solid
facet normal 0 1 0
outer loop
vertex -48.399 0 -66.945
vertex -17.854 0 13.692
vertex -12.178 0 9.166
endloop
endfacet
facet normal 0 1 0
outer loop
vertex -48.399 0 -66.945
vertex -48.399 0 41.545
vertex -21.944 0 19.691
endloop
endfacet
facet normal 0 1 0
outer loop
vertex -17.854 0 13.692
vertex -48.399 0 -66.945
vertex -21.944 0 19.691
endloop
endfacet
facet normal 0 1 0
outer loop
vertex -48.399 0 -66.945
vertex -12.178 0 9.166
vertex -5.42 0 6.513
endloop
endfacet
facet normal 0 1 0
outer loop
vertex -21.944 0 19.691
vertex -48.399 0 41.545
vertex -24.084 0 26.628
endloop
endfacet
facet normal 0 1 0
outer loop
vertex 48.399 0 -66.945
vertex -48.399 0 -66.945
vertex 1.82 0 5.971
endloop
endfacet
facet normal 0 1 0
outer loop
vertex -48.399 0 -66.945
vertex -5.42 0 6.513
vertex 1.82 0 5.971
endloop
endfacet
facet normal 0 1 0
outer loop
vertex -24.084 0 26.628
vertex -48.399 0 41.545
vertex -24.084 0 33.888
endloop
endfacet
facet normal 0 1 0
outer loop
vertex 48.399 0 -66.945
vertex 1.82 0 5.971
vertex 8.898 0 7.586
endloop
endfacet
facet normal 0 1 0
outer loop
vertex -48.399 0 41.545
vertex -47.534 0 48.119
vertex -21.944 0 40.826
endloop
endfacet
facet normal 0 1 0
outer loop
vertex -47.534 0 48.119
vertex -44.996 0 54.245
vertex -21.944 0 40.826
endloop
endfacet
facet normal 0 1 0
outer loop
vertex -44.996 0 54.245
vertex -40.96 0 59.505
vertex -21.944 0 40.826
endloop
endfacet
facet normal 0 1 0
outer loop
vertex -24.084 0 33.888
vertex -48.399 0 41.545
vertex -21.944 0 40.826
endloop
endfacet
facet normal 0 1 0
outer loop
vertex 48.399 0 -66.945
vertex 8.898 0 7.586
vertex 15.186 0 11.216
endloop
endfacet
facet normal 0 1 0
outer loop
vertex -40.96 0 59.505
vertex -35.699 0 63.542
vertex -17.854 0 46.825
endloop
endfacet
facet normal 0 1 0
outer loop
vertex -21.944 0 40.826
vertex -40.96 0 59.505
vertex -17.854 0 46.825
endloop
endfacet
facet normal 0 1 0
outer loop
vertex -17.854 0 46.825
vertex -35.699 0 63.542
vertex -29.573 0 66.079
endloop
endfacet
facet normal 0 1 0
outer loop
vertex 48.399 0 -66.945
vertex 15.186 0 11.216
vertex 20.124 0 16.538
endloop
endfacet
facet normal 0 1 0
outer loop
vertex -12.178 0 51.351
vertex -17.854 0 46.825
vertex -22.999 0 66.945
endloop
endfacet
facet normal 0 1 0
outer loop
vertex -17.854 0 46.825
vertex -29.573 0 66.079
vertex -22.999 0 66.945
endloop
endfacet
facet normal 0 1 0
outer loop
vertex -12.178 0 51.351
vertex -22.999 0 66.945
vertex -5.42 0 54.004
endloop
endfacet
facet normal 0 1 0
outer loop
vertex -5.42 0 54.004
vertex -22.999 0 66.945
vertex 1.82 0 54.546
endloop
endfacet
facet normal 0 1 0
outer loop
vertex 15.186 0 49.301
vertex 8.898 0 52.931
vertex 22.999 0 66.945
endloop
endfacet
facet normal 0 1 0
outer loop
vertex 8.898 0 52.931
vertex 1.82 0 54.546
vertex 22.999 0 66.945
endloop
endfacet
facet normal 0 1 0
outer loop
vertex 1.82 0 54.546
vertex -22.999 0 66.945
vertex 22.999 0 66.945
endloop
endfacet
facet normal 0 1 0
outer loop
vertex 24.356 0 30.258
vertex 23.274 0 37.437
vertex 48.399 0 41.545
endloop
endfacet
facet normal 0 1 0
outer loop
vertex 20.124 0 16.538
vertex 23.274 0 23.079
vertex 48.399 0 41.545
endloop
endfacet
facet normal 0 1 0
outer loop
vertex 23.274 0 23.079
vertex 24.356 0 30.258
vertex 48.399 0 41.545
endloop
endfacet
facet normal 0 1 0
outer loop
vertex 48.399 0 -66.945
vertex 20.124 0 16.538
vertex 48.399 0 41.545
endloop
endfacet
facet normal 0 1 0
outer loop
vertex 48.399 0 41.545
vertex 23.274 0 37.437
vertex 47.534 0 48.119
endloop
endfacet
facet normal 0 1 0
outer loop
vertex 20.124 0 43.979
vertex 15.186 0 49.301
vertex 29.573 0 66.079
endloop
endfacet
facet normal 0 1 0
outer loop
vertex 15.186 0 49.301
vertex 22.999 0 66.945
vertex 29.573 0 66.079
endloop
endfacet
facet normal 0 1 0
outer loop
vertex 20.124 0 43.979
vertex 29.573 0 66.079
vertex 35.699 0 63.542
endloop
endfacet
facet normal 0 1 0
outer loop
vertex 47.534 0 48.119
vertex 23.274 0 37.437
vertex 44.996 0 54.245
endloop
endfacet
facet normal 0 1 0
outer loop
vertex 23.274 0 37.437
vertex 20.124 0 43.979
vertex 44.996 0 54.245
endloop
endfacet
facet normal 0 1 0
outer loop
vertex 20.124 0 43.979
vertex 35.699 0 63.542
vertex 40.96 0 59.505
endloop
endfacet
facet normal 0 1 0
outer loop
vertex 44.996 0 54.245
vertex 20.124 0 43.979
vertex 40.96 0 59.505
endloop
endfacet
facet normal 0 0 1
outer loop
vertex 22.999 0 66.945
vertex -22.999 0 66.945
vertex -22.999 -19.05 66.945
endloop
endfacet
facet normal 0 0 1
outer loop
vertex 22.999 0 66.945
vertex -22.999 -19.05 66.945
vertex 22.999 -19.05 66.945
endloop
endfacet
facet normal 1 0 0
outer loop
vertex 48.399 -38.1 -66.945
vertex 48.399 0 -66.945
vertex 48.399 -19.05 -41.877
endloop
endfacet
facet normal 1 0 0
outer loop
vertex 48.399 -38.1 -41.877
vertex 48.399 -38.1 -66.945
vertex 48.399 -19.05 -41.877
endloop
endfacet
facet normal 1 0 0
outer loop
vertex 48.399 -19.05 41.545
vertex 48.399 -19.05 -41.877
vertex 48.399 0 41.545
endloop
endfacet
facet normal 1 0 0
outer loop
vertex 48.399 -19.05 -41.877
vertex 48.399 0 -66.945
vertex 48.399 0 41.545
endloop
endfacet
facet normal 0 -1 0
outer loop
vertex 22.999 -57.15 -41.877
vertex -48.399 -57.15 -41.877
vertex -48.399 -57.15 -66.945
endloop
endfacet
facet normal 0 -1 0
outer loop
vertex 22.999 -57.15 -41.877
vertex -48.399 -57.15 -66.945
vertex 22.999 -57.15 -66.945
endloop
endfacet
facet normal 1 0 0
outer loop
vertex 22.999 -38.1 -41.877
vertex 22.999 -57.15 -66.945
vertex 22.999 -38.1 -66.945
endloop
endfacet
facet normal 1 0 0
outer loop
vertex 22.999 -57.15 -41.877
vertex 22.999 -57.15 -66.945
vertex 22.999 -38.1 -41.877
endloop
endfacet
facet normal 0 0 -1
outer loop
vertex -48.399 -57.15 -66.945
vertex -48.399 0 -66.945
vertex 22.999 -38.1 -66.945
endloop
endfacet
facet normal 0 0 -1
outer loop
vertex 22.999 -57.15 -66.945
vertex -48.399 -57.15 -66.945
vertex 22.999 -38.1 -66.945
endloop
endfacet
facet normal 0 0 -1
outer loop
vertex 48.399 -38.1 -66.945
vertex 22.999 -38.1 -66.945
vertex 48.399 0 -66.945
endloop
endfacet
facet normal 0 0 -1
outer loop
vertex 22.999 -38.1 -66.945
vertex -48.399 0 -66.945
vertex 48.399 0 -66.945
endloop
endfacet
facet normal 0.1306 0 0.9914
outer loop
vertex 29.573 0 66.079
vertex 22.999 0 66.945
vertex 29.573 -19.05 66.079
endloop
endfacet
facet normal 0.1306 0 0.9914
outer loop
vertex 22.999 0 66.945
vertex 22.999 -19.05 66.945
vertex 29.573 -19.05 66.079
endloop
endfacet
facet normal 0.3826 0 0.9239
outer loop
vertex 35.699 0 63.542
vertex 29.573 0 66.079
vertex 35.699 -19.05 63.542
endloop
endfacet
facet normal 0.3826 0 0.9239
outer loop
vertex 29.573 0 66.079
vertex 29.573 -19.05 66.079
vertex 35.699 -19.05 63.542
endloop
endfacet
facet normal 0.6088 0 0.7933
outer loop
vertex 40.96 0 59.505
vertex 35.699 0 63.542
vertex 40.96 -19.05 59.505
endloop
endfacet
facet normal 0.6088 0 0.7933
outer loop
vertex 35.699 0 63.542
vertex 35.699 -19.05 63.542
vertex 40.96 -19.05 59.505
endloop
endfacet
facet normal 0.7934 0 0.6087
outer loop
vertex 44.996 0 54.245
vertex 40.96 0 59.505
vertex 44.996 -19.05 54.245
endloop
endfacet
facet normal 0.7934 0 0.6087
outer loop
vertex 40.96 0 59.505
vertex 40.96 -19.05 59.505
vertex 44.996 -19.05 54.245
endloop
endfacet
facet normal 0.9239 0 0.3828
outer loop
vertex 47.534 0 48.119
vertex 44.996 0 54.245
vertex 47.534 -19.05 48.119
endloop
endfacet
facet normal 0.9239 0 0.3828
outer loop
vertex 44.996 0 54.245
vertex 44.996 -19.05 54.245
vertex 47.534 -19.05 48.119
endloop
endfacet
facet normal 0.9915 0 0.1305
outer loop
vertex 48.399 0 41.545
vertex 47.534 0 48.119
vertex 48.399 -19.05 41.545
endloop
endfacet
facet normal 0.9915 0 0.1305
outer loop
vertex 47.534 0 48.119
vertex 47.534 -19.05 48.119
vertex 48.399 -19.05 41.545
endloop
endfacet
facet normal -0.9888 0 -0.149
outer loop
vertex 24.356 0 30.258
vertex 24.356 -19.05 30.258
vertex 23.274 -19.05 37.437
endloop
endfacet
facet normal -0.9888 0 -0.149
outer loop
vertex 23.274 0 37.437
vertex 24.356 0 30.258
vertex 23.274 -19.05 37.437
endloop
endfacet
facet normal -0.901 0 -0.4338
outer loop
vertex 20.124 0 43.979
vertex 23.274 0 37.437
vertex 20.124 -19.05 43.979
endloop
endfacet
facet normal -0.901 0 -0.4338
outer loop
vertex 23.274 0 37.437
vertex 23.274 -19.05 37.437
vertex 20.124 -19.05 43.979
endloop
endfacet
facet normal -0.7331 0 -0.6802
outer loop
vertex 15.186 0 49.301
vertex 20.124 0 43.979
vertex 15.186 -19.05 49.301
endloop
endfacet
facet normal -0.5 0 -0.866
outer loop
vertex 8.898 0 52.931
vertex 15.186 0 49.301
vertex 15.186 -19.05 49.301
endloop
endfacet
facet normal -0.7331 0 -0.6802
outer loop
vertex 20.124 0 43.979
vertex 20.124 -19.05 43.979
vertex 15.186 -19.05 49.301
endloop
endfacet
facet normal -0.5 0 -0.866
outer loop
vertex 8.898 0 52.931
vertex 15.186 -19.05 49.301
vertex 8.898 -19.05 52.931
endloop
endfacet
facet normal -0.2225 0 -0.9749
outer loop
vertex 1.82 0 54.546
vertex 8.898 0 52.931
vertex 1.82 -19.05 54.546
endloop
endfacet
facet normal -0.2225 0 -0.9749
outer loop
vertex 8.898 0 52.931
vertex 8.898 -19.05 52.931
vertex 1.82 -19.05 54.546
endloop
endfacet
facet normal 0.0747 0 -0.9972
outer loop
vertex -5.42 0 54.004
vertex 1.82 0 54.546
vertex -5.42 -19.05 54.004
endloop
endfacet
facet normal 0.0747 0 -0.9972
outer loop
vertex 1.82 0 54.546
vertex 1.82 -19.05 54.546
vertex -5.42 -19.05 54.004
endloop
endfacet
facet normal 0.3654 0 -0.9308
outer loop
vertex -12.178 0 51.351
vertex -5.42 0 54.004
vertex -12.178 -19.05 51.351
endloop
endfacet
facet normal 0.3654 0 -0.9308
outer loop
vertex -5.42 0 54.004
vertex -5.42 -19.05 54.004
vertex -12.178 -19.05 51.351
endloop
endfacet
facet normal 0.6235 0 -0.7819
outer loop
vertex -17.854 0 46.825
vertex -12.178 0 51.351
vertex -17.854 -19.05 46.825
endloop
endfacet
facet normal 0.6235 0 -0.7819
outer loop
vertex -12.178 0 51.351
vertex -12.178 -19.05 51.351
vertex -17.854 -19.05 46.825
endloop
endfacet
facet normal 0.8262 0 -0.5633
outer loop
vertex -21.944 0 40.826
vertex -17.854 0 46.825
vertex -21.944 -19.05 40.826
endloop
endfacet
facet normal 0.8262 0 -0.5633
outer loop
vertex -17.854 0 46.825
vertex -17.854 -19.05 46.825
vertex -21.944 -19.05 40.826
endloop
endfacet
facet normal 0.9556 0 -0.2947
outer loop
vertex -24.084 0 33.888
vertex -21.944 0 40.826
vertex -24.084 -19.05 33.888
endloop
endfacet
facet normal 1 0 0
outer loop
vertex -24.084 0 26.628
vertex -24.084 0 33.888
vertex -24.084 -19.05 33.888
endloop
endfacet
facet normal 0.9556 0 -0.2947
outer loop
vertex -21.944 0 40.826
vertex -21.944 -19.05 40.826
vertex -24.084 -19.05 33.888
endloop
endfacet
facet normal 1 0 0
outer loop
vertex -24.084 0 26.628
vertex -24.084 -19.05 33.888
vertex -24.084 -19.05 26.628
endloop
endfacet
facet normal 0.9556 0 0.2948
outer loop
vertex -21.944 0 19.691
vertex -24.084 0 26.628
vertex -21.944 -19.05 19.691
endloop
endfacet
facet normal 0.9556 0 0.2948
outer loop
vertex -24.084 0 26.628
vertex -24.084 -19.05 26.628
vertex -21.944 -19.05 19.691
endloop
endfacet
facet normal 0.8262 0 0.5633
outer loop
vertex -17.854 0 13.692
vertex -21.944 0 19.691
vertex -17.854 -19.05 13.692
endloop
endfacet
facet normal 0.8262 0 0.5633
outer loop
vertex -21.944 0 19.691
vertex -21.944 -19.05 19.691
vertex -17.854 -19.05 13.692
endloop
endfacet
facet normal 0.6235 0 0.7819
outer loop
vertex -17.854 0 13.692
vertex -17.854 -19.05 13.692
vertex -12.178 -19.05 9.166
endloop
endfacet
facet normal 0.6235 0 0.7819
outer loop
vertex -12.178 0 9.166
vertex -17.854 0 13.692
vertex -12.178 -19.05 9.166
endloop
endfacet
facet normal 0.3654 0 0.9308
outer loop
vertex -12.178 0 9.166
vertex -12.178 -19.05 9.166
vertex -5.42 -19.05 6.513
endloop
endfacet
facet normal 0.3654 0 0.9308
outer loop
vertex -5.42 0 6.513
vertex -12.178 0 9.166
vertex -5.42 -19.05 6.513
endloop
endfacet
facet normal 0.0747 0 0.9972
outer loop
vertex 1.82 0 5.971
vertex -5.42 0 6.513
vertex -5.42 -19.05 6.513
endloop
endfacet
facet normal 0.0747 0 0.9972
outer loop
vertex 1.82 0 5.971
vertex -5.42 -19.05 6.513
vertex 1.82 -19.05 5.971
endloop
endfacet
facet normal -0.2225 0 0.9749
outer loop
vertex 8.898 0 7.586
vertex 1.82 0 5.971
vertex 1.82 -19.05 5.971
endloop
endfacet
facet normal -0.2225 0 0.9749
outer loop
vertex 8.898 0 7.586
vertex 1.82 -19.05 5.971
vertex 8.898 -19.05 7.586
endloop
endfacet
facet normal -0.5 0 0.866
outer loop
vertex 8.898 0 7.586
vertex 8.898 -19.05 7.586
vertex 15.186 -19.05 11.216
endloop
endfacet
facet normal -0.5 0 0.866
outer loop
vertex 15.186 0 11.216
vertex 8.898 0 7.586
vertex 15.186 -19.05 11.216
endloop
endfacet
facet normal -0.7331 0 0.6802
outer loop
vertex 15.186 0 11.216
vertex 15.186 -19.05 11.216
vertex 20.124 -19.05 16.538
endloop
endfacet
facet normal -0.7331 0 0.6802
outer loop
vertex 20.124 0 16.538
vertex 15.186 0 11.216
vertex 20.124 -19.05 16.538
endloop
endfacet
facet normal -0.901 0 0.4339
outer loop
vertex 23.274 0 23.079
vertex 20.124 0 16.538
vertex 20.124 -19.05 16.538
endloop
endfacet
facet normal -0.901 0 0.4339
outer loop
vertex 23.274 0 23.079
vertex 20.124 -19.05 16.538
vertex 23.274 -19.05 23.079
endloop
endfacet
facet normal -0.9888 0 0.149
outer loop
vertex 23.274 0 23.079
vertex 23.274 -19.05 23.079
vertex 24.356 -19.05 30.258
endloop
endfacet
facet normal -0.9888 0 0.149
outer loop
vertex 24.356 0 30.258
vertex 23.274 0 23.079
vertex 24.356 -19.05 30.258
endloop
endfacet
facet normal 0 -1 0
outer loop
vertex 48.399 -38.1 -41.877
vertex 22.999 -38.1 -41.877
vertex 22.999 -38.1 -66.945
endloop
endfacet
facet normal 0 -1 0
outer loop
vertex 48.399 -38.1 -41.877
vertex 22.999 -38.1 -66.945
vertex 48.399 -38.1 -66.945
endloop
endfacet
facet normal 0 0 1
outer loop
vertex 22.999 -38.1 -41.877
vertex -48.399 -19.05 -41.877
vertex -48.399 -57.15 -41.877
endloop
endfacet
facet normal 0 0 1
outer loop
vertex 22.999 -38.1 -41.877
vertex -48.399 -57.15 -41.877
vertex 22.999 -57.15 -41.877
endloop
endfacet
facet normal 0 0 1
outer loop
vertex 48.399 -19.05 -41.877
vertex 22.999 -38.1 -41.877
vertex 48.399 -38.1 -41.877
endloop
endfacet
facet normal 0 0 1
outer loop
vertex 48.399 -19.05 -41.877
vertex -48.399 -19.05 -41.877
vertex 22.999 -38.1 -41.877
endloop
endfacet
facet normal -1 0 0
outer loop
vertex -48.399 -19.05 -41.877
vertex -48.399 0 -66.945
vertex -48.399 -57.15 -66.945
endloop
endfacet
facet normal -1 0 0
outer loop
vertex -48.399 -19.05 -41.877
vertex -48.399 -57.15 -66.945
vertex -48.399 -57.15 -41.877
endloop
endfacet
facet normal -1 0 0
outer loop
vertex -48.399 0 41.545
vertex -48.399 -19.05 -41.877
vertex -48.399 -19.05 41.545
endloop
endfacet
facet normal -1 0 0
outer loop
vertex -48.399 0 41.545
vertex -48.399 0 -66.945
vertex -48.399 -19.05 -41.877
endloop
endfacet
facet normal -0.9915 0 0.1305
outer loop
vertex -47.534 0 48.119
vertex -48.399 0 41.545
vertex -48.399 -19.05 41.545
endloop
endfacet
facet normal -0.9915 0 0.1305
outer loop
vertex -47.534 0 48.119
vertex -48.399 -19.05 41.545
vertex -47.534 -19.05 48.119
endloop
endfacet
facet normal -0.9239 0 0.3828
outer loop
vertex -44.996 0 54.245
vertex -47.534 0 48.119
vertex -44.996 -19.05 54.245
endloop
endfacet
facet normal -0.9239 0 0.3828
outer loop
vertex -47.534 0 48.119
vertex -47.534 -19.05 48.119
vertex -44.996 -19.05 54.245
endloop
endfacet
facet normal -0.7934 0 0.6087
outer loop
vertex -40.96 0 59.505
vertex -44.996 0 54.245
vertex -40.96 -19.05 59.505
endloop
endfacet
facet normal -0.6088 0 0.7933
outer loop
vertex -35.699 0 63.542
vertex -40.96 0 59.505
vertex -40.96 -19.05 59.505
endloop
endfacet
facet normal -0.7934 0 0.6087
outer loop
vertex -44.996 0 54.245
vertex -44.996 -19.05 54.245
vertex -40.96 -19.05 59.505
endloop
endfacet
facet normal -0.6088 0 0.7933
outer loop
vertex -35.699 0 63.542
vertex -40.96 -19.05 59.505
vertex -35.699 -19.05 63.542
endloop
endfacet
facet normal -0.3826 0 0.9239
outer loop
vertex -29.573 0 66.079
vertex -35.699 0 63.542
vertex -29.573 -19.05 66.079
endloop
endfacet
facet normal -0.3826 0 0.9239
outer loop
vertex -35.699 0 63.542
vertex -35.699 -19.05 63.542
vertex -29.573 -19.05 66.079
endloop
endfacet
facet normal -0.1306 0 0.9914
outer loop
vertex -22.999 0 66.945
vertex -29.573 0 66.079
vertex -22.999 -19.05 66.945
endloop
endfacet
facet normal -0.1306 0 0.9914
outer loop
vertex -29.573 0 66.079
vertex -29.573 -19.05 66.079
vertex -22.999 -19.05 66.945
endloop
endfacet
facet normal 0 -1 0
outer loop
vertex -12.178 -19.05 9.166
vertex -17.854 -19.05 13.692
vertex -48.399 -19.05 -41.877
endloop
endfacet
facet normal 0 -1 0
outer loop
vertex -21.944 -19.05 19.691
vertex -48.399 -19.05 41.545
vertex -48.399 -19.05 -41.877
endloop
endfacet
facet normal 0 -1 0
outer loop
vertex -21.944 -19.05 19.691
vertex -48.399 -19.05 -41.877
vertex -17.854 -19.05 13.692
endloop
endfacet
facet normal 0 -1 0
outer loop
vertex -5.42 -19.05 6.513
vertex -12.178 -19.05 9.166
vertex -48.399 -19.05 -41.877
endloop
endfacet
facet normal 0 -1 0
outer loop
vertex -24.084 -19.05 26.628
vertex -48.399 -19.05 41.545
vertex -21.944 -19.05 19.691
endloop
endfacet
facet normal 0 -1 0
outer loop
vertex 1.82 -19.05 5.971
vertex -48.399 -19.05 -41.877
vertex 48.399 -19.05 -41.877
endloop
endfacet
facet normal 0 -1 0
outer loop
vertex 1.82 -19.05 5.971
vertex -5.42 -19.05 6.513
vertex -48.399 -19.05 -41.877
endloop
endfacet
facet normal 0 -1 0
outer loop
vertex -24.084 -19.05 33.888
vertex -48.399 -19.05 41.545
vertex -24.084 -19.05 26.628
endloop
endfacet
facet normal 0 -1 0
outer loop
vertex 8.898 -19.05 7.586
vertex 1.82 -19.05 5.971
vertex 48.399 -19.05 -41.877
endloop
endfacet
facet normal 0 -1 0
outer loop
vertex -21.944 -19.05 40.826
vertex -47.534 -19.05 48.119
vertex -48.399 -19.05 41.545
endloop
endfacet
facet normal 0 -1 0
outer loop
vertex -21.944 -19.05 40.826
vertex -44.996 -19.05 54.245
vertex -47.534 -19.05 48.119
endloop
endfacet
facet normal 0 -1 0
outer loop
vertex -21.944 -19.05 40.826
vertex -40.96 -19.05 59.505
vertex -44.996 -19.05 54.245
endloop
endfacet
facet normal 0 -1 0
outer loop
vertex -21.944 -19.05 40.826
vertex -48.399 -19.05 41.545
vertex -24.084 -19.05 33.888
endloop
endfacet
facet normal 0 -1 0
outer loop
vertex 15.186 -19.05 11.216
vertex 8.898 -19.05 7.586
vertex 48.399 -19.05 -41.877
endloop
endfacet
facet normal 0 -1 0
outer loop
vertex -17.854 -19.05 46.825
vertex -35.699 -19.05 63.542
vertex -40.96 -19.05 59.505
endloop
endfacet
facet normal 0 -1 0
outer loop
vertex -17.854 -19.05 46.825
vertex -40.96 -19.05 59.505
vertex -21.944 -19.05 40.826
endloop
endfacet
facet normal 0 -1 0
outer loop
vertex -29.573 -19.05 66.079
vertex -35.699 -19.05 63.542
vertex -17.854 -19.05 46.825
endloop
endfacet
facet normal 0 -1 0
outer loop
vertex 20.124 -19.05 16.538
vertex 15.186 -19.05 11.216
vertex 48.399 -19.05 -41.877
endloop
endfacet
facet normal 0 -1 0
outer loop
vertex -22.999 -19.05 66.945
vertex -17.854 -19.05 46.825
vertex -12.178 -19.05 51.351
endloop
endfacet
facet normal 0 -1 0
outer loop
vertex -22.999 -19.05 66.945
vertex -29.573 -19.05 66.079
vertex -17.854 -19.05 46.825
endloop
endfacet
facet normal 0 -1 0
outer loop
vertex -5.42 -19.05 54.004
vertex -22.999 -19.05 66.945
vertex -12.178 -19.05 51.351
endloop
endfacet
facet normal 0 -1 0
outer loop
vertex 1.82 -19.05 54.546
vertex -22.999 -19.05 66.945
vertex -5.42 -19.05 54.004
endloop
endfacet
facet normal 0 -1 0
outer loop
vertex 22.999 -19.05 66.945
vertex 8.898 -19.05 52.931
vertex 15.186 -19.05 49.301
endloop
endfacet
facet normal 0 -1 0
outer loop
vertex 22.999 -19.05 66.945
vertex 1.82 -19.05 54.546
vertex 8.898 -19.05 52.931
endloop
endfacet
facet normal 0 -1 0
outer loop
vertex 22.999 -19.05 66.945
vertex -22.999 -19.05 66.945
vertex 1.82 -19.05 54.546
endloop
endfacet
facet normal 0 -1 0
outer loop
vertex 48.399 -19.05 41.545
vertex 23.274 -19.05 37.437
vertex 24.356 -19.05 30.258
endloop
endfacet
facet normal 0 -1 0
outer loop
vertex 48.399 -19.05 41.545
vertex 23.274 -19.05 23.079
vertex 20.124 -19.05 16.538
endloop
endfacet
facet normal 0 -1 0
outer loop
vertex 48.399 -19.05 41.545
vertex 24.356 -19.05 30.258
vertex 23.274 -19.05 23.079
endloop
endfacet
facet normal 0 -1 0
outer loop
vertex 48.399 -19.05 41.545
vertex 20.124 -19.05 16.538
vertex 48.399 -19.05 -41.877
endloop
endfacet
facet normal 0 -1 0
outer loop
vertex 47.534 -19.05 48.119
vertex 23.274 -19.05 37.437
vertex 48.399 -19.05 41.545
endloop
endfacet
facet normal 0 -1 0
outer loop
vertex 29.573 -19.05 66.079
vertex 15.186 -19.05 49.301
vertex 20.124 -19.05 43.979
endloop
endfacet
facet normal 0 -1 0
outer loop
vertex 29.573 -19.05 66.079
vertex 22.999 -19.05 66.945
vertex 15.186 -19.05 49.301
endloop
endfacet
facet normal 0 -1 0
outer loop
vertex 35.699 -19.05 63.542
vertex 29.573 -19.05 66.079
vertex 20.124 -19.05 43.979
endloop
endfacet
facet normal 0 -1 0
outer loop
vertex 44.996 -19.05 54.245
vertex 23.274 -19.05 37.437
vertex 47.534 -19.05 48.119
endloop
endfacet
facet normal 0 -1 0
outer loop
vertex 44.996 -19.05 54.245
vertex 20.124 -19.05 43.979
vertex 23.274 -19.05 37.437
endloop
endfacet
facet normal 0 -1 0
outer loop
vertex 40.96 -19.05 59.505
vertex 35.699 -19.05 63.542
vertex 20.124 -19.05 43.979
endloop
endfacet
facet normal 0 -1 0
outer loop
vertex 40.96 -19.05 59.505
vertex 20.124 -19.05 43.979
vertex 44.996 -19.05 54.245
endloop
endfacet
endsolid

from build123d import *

# Parameters (mm, degrees)
F0_W     = 96.798718
F0_H     = 133.88981
F1_DEPTH = 19.05
F2_W     = 96.798718
F2_H     = 25.068198
F3_DEPTH = 38.1
F4_W     = 25.4
F4_H     = 25.068198
F5_DEPTH = 19.05
F6_R     = 24.355742
F7_DEPTH = 19.051
F8_R     = 25.4
F9_R     = 25.4


with BuildPart() as f1:
    # F0 (on Front) → F1 (new body)
    with BuildSketch(Plane.XZ):
        Rectangle(F0_W, F0_H)
    extrude(amount=F1_DEPTH)

    # F2 (on face) → F3 (join)
    with BuildSketch(Plane.XZ.offset(19.05)):
        with Locations((0, -54.410806)):
            Rectangle(F2_W, F2_H)
    extrude(amount=F3_DEPTH)

    # F4 (on face) → F5 (cut)
    with BuildSketch(Plane.XZ.offset(57.15)):
        with Locations((35.699359, -54.410806)):
            Rectangle(F4_W, F4_H)
    extrude(amount=-F5_DEPTH, mode=Mode.SUBTRACT)

    # F6 (on face) → F7 (cut, through all)
    with BuildSketch(Plane.XZ.offset(19.05)):
        with Locations((0, 30.258423)):
            Circle(F6_R)
    extrude(amount=-F7_DEPTH, mode=Mode.SUBTRACT)

    # F8
    f8_edges = [f1.edges().sort_by_distance(p)[0] for p in [
        (-48.399359, -9.525, 66.944905),
    ]]
    fillet(f8_edges, radius=F8_R)

    # F9
    f9_edges = [f1.edges().sort_by_distance(p)[0] for p in [
        (48.399359, -9.525, 66.944905),
    ]]
    fillet(f9_edges, radius=F9_R)


solid = f1.part
